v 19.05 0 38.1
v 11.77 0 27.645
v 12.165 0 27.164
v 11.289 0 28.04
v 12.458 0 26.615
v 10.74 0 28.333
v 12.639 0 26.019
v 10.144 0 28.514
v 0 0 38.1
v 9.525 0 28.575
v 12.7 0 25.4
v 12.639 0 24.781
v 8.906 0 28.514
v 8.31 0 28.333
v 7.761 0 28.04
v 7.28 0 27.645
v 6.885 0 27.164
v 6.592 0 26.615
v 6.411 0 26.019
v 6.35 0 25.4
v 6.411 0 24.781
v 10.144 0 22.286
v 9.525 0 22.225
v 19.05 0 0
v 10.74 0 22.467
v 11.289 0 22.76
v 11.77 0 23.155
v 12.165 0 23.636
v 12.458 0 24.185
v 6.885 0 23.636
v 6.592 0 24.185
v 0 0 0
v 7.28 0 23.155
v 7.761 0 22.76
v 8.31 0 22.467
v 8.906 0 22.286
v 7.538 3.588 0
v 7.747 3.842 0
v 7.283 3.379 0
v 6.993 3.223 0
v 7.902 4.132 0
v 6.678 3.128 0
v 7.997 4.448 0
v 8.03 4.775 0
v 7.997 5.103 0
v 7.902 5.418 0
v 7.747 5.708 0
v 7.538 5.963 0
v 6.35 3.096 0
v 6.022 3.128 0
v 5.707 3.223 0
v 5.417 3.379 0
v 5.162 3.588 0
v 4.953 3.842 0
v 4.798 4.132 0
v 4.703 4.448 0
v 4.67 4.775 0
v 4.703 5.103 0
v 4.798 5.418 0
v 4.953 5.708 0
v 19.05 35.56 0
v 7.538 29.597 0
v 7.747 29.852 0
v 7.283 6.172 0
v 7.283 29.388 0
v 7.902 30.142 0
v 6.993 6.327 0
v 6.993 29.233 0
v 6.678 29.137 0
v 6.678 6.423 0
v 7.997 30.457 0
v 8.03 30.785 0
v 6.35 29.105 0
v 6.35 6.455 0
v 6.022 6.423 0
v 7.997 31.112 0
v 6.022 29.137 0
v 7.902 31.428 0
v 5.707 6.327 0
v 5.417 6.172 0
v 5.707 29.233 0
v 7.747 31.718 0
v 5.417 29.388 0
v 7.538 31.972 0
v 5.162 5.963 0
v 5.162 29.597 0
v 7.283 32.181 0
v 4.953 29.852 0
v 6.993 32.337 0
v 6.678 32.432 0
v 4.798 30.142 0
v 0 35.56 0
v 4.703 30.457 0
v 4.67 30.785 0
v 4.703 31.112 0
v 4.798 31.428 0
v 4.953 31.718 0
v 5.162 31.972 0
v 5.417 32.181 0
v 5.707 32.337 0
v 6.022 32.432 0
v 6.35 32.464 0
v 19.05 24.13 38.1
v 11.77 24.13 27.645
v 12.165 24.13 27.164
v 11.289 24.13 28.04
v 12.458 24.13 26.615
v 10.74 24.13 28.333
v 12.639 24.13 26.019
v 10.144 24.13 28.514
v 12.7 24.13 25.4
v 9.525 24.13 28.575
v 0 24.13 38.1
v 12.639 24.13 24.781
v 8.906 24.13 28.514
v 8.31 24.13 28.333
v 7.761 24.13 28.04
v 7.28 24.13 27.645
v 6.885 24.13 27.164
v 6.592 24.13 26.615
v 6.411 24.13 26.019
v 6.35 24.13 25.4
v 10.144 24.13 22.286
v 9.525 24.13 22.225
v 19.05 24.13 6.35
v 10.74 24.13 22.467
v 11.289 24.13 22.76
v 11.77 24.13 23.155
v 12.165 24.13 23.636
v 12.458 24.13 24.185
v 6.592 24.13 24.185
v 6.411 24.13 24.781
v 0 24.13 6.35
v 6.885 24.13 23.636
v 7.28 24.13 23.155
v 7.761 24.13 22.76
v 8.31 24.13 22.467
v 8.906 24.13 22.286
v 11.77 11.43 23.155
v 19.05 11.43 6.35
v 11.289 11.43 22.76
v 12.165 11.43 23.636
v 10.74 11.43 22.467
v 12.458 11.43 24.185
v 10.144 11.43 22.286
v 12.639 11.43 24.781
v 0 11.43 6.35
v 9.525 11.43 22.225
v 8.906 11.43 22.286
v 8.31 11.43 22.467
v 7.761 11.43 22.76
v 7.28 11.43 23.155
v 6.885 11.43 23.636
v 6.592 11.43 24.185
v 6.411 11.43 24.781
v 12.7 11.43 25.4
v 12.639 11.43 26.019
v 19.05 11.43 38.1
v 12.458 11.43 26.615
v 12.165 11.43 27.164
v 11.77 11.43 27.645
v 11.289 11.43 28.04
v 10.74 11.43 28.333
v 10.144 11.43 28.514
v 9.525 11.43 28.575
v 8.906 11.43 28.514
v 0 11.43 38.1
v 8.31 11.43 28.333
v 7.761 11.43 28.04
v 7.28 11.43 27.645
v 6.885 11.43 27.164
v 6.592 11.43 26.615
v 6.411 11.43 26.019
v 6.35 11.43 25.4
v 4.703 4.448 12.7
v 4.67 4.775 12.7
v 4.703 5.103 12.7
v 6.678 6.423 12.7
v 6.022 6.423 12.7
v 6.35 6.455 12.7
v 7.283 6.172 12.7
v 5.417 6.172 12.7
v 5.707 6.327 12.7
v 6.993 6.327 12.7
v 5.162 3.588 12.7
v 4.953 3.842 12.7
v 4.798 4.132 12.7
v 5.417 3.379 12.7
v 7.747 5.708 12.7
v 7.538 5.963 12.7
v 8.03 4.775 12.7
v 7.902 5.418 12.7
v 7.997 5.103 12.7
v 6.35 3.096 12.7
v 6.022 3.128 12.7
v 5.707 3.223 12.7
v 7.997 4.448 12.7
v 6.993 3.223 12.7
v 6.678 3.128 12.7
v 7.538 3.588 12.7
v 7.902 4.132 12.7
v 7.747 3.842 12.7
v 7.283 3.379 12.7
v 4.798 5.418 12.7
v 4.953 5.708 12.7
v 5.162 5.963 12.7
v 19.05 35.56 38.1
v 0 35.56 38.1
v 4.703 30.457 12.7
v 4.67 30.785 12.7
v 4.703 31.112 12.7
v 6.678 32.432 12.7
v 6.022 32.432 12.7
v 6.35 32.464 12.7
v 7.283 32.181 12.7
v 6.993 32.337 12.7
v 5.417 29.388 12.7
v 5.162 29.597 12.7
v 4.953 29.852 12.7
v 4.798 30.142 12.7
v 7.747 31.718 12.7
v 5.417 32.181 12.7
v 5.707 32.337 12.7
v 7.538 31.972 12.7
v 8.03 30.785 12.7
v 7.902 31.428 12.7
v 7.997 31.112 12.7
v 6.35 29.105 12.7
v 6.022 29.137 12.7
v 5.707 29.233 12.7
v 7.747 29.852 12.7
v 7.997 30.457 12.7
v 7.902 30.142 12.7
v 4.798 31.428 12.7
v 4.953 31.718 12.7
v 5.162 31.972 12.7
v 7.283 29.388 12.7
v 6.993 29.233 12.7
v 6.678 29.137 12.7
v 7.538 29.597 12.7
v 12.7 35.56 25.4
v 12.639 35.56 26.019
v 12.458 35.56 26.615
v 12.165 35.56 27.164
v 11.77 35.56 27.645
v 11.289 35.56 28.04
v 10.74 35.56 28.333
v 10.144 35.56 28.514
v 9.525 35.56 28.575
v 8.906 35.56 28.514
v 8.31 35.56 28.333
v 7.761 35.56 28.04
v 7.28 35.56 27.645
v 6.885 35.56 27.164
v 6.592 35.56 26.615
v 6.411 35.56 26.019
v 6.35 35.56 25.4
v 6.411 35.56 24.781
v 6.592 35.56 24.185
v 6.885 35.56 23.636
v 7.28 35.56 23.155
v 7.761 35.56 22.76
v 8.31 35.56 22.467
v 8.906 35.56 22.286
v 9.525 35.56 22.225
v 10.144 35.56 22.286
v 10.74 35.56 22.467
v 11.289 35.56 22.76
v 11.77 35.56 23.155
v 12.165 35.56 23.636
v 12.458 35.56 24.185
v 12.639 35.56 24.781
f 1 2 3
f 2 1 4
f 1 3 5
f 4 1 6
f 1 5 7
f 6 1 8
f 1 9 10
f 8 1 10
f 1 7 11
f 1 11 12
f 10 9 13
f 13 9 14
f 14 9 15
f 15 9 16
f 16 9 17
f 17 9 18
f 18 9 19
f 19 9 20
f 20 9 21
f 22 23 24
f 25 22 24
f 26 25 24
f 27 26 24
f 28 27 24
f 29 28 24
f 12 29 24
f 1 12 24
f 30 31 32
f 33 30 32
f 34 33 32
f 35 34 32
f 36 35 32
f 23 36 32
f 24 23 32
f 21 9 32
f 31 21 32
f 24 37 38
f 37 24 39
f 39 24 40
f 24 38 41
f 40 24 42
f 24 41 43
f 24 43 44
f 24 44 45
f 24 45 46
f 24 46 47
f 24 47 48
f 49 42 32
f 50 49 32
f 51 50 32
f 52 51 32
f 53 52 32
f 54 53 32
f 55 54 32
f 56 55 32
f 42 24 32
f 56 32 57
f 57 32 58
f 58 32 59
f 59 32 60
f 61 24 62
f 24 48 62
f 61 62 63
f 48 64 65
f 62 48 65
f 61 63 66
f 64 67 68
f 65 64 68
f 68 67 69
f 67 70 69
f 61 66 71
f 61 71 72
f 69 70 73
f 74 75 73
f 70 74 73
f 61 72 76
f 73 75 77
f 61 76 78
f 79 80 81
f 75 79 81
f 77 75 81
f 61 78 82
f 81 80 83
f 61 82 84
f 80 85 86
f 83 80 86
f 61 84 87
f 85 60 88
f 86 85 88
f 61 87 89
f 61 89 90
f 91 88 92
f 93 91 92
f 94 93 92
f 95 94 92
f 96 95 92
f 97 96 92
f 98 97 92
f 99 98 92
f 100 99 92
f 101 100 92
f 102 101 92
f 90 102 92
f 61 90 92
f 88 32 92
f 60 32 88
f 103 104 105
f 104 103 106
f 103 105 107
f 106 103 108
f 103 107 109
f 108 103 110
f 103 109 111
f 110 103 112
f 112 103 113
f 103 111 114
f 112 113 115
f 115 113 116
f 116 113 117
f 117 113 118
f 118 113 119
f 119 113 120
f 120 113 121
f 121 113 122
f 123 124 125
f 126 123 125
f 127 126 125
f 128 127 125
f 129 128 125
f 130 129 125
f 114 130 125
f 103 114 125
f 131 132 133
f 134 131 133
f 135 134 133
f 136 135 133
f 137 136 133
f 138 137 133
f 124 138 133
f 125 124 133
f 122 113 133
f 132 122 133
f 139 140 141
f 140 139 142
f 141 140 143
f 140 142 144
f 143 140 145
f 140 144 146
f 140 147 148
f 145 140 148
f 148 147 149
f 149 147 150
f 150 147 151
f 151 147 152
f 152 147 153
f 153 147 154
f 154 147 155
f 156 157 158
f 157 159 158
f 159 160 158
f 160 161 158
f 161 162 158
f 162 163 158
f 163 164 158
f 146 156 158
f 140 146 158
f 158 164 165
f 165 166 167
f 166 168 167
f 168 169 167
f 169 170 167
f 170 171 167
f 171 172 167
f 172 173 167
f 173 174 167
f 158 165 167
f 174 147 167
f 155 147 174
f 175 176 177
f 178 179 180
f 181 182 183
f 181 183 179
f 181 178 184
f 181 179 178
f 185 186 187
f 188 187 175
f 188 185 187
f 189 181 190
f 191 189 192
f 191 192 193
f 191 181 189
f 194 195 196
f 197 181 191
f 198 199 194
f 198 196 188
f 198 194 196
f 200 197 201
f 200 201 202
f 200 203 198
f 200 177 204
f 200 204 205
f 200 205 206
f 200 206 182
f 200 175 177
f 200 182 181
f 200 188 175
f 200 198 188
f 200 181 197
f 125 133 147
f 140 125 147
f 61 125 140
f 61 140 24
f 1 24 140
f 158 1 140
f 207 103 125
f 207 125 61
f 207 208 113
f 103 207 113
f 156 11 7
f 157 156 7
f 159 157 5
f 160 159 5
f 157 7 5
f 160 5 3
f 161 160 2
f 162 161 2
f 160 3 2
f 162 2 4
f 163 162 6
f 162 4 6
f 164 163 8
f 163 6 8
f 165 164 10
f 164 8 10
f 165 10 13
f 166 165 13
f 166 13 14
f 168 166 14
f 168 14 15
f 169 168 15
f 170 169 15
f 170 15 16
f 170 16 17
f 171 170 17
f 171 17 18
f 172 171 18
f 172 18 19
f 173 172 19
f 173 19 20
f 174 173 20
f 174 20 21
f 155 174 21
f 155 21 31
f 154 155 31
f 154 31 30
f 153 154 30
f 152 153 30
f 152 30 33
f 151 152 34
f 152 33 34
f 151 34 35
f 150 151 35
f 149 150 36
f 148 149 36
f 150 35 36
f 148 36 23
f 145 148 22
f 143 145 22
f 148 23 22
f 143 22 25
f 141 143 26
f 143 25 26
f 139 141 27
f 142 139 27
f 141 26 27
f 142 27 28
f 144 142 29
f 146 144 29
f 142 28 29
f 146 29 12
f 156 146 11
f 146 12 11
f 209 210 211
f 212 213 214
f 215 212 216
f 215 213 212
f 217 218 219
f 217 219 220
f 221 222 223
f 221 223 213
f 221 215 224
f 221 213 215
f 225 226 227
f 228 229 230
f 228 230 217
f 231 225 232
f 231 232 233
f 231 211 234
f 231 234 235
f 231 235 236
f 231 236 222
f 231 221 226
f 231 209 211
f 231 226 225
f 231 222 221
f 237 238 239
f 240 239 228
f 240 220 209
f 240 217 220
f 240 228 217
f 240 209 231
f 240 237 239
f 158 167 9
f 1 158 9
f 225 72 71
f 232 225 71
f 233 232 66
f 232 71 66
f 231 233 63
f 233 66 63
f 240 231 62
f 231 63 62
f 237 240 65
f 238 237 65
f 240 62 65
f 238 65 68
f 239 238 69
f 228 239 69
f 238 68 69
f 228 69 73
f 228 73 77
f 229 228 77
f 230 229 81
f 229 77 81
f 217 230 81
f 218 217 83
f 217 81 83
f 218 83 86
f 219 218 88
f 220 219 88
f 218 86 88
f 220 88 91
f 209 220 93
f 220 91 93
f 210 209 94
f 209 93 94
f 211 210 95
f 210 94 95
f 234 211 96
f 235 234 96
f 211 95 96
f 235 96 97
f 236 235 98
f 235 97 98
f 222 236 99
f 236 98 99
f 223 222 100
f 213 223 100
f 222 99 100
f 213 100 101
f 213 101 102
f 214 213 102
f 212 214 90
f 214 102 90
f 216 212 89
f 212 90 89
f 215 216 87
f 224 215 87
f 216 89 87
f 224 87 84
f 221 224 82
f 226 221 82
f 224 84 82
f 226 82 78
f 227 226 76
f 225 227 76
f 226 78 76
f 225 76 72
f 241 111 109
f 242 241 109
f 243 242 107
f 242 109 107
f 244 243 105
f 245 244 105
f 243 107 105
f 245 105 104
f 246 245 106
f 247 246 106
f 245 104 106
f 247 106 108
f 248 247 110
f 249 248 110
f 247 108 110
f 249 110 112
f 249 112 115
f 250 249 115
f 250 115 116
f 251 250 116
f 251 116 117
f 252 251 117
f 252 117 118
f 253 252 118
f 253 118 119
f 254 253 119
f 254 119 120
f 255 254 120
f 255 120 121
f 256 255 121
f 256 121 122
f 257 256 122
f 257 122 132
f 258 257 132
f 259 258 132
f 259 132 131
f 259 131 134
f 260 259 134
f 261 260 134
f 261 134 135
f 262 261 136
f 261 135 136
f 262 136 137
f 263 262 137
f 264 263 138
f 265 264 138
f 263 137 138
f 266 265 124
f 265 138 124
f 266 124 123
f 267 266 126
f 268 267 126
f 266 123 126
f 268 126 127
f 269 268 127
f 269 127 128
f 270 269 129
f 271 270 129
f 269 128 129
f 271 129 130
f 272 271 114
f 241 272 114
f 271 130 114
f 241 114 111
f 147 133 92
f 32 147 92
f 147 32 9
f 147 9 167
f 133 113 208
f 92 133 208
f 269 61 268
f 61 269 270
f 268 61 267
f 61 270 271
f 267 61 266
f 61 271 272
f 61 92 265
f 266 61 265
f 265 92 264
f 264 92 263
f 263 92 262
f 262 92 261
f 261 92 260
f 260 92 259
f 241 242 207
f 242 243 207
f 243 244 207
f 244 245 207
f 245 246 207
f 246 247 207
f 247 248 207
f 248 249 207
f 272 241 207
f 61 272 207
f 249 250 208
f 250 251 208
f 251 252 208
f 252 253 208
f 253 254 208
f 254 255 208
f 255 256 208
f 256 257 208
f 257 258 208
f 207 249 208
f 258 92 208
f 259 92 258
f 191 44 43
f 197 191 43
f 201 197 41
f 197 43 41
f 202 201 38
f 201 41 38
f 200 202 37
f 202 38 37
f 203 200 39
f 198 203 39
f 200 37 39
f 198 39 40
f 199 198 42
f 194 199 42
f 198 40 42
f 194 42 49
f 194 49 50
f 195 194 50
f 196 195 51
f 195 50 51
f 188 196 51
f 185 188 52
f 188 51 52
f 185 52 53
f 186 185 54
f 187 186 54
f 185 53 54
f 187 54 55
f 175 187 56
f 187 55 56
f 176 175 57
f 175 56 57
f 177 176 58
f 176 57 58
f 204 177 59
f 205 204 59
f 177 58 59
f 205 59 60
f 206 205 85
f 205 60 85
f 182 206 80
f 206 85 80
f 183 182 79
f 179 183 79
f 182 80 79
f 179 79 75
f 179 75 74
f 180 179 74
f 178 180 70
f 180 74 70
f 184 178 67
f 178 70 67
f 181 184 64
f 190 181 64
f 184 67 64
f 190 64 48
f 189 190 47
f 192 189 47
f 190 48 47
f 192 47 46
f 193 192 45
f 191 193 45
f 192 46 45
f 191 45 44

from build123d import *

# Parameters (mm, degrees)
F1_DEPTH = 19.05
F2_R     = 3.175
F3_DEPTH = 76.2
F4_R     = 1.679652
F5_DEPTH = 12.7


with BuildPart() as f1:
    # F0 (on Right) → F1 (new body)
    with BuildSketch(Plane.YZ):
        Polygon((11.43, 38.1), (0, 38.1), (0, 0), (35.56, 0), (35.56, 38.1), (24.13, 38.1), (24.13, 6.35), (11.43, 6.35), align=None)
    extrude(amount=F1_DEPTH)

    # F2 (on face) → F3 (cut)
    with BuildSketch(Plane.XZ):
        with Locations((9.525, 25.4)):
            Circle(F2_R)
    extrude(amount=-F3_DEPTH, mode=Mode.SUBTRACT)

    # F4 (on face) → F5 (cut)
    with BuildSketch(Plane(origin=(0, 0, 0), x_dir=(1, 0, 0), z_dir=(0, 0, -1))):
        with Locations((6.35, -4.7752)):
            Circle(F4_R)
        with Locations((6.35, -30.7848)):
            Circle(F4_R)
    extrude(amount=-F5_DEPTH, mode=Mode.SUBTRACT)


solid = f1.part
